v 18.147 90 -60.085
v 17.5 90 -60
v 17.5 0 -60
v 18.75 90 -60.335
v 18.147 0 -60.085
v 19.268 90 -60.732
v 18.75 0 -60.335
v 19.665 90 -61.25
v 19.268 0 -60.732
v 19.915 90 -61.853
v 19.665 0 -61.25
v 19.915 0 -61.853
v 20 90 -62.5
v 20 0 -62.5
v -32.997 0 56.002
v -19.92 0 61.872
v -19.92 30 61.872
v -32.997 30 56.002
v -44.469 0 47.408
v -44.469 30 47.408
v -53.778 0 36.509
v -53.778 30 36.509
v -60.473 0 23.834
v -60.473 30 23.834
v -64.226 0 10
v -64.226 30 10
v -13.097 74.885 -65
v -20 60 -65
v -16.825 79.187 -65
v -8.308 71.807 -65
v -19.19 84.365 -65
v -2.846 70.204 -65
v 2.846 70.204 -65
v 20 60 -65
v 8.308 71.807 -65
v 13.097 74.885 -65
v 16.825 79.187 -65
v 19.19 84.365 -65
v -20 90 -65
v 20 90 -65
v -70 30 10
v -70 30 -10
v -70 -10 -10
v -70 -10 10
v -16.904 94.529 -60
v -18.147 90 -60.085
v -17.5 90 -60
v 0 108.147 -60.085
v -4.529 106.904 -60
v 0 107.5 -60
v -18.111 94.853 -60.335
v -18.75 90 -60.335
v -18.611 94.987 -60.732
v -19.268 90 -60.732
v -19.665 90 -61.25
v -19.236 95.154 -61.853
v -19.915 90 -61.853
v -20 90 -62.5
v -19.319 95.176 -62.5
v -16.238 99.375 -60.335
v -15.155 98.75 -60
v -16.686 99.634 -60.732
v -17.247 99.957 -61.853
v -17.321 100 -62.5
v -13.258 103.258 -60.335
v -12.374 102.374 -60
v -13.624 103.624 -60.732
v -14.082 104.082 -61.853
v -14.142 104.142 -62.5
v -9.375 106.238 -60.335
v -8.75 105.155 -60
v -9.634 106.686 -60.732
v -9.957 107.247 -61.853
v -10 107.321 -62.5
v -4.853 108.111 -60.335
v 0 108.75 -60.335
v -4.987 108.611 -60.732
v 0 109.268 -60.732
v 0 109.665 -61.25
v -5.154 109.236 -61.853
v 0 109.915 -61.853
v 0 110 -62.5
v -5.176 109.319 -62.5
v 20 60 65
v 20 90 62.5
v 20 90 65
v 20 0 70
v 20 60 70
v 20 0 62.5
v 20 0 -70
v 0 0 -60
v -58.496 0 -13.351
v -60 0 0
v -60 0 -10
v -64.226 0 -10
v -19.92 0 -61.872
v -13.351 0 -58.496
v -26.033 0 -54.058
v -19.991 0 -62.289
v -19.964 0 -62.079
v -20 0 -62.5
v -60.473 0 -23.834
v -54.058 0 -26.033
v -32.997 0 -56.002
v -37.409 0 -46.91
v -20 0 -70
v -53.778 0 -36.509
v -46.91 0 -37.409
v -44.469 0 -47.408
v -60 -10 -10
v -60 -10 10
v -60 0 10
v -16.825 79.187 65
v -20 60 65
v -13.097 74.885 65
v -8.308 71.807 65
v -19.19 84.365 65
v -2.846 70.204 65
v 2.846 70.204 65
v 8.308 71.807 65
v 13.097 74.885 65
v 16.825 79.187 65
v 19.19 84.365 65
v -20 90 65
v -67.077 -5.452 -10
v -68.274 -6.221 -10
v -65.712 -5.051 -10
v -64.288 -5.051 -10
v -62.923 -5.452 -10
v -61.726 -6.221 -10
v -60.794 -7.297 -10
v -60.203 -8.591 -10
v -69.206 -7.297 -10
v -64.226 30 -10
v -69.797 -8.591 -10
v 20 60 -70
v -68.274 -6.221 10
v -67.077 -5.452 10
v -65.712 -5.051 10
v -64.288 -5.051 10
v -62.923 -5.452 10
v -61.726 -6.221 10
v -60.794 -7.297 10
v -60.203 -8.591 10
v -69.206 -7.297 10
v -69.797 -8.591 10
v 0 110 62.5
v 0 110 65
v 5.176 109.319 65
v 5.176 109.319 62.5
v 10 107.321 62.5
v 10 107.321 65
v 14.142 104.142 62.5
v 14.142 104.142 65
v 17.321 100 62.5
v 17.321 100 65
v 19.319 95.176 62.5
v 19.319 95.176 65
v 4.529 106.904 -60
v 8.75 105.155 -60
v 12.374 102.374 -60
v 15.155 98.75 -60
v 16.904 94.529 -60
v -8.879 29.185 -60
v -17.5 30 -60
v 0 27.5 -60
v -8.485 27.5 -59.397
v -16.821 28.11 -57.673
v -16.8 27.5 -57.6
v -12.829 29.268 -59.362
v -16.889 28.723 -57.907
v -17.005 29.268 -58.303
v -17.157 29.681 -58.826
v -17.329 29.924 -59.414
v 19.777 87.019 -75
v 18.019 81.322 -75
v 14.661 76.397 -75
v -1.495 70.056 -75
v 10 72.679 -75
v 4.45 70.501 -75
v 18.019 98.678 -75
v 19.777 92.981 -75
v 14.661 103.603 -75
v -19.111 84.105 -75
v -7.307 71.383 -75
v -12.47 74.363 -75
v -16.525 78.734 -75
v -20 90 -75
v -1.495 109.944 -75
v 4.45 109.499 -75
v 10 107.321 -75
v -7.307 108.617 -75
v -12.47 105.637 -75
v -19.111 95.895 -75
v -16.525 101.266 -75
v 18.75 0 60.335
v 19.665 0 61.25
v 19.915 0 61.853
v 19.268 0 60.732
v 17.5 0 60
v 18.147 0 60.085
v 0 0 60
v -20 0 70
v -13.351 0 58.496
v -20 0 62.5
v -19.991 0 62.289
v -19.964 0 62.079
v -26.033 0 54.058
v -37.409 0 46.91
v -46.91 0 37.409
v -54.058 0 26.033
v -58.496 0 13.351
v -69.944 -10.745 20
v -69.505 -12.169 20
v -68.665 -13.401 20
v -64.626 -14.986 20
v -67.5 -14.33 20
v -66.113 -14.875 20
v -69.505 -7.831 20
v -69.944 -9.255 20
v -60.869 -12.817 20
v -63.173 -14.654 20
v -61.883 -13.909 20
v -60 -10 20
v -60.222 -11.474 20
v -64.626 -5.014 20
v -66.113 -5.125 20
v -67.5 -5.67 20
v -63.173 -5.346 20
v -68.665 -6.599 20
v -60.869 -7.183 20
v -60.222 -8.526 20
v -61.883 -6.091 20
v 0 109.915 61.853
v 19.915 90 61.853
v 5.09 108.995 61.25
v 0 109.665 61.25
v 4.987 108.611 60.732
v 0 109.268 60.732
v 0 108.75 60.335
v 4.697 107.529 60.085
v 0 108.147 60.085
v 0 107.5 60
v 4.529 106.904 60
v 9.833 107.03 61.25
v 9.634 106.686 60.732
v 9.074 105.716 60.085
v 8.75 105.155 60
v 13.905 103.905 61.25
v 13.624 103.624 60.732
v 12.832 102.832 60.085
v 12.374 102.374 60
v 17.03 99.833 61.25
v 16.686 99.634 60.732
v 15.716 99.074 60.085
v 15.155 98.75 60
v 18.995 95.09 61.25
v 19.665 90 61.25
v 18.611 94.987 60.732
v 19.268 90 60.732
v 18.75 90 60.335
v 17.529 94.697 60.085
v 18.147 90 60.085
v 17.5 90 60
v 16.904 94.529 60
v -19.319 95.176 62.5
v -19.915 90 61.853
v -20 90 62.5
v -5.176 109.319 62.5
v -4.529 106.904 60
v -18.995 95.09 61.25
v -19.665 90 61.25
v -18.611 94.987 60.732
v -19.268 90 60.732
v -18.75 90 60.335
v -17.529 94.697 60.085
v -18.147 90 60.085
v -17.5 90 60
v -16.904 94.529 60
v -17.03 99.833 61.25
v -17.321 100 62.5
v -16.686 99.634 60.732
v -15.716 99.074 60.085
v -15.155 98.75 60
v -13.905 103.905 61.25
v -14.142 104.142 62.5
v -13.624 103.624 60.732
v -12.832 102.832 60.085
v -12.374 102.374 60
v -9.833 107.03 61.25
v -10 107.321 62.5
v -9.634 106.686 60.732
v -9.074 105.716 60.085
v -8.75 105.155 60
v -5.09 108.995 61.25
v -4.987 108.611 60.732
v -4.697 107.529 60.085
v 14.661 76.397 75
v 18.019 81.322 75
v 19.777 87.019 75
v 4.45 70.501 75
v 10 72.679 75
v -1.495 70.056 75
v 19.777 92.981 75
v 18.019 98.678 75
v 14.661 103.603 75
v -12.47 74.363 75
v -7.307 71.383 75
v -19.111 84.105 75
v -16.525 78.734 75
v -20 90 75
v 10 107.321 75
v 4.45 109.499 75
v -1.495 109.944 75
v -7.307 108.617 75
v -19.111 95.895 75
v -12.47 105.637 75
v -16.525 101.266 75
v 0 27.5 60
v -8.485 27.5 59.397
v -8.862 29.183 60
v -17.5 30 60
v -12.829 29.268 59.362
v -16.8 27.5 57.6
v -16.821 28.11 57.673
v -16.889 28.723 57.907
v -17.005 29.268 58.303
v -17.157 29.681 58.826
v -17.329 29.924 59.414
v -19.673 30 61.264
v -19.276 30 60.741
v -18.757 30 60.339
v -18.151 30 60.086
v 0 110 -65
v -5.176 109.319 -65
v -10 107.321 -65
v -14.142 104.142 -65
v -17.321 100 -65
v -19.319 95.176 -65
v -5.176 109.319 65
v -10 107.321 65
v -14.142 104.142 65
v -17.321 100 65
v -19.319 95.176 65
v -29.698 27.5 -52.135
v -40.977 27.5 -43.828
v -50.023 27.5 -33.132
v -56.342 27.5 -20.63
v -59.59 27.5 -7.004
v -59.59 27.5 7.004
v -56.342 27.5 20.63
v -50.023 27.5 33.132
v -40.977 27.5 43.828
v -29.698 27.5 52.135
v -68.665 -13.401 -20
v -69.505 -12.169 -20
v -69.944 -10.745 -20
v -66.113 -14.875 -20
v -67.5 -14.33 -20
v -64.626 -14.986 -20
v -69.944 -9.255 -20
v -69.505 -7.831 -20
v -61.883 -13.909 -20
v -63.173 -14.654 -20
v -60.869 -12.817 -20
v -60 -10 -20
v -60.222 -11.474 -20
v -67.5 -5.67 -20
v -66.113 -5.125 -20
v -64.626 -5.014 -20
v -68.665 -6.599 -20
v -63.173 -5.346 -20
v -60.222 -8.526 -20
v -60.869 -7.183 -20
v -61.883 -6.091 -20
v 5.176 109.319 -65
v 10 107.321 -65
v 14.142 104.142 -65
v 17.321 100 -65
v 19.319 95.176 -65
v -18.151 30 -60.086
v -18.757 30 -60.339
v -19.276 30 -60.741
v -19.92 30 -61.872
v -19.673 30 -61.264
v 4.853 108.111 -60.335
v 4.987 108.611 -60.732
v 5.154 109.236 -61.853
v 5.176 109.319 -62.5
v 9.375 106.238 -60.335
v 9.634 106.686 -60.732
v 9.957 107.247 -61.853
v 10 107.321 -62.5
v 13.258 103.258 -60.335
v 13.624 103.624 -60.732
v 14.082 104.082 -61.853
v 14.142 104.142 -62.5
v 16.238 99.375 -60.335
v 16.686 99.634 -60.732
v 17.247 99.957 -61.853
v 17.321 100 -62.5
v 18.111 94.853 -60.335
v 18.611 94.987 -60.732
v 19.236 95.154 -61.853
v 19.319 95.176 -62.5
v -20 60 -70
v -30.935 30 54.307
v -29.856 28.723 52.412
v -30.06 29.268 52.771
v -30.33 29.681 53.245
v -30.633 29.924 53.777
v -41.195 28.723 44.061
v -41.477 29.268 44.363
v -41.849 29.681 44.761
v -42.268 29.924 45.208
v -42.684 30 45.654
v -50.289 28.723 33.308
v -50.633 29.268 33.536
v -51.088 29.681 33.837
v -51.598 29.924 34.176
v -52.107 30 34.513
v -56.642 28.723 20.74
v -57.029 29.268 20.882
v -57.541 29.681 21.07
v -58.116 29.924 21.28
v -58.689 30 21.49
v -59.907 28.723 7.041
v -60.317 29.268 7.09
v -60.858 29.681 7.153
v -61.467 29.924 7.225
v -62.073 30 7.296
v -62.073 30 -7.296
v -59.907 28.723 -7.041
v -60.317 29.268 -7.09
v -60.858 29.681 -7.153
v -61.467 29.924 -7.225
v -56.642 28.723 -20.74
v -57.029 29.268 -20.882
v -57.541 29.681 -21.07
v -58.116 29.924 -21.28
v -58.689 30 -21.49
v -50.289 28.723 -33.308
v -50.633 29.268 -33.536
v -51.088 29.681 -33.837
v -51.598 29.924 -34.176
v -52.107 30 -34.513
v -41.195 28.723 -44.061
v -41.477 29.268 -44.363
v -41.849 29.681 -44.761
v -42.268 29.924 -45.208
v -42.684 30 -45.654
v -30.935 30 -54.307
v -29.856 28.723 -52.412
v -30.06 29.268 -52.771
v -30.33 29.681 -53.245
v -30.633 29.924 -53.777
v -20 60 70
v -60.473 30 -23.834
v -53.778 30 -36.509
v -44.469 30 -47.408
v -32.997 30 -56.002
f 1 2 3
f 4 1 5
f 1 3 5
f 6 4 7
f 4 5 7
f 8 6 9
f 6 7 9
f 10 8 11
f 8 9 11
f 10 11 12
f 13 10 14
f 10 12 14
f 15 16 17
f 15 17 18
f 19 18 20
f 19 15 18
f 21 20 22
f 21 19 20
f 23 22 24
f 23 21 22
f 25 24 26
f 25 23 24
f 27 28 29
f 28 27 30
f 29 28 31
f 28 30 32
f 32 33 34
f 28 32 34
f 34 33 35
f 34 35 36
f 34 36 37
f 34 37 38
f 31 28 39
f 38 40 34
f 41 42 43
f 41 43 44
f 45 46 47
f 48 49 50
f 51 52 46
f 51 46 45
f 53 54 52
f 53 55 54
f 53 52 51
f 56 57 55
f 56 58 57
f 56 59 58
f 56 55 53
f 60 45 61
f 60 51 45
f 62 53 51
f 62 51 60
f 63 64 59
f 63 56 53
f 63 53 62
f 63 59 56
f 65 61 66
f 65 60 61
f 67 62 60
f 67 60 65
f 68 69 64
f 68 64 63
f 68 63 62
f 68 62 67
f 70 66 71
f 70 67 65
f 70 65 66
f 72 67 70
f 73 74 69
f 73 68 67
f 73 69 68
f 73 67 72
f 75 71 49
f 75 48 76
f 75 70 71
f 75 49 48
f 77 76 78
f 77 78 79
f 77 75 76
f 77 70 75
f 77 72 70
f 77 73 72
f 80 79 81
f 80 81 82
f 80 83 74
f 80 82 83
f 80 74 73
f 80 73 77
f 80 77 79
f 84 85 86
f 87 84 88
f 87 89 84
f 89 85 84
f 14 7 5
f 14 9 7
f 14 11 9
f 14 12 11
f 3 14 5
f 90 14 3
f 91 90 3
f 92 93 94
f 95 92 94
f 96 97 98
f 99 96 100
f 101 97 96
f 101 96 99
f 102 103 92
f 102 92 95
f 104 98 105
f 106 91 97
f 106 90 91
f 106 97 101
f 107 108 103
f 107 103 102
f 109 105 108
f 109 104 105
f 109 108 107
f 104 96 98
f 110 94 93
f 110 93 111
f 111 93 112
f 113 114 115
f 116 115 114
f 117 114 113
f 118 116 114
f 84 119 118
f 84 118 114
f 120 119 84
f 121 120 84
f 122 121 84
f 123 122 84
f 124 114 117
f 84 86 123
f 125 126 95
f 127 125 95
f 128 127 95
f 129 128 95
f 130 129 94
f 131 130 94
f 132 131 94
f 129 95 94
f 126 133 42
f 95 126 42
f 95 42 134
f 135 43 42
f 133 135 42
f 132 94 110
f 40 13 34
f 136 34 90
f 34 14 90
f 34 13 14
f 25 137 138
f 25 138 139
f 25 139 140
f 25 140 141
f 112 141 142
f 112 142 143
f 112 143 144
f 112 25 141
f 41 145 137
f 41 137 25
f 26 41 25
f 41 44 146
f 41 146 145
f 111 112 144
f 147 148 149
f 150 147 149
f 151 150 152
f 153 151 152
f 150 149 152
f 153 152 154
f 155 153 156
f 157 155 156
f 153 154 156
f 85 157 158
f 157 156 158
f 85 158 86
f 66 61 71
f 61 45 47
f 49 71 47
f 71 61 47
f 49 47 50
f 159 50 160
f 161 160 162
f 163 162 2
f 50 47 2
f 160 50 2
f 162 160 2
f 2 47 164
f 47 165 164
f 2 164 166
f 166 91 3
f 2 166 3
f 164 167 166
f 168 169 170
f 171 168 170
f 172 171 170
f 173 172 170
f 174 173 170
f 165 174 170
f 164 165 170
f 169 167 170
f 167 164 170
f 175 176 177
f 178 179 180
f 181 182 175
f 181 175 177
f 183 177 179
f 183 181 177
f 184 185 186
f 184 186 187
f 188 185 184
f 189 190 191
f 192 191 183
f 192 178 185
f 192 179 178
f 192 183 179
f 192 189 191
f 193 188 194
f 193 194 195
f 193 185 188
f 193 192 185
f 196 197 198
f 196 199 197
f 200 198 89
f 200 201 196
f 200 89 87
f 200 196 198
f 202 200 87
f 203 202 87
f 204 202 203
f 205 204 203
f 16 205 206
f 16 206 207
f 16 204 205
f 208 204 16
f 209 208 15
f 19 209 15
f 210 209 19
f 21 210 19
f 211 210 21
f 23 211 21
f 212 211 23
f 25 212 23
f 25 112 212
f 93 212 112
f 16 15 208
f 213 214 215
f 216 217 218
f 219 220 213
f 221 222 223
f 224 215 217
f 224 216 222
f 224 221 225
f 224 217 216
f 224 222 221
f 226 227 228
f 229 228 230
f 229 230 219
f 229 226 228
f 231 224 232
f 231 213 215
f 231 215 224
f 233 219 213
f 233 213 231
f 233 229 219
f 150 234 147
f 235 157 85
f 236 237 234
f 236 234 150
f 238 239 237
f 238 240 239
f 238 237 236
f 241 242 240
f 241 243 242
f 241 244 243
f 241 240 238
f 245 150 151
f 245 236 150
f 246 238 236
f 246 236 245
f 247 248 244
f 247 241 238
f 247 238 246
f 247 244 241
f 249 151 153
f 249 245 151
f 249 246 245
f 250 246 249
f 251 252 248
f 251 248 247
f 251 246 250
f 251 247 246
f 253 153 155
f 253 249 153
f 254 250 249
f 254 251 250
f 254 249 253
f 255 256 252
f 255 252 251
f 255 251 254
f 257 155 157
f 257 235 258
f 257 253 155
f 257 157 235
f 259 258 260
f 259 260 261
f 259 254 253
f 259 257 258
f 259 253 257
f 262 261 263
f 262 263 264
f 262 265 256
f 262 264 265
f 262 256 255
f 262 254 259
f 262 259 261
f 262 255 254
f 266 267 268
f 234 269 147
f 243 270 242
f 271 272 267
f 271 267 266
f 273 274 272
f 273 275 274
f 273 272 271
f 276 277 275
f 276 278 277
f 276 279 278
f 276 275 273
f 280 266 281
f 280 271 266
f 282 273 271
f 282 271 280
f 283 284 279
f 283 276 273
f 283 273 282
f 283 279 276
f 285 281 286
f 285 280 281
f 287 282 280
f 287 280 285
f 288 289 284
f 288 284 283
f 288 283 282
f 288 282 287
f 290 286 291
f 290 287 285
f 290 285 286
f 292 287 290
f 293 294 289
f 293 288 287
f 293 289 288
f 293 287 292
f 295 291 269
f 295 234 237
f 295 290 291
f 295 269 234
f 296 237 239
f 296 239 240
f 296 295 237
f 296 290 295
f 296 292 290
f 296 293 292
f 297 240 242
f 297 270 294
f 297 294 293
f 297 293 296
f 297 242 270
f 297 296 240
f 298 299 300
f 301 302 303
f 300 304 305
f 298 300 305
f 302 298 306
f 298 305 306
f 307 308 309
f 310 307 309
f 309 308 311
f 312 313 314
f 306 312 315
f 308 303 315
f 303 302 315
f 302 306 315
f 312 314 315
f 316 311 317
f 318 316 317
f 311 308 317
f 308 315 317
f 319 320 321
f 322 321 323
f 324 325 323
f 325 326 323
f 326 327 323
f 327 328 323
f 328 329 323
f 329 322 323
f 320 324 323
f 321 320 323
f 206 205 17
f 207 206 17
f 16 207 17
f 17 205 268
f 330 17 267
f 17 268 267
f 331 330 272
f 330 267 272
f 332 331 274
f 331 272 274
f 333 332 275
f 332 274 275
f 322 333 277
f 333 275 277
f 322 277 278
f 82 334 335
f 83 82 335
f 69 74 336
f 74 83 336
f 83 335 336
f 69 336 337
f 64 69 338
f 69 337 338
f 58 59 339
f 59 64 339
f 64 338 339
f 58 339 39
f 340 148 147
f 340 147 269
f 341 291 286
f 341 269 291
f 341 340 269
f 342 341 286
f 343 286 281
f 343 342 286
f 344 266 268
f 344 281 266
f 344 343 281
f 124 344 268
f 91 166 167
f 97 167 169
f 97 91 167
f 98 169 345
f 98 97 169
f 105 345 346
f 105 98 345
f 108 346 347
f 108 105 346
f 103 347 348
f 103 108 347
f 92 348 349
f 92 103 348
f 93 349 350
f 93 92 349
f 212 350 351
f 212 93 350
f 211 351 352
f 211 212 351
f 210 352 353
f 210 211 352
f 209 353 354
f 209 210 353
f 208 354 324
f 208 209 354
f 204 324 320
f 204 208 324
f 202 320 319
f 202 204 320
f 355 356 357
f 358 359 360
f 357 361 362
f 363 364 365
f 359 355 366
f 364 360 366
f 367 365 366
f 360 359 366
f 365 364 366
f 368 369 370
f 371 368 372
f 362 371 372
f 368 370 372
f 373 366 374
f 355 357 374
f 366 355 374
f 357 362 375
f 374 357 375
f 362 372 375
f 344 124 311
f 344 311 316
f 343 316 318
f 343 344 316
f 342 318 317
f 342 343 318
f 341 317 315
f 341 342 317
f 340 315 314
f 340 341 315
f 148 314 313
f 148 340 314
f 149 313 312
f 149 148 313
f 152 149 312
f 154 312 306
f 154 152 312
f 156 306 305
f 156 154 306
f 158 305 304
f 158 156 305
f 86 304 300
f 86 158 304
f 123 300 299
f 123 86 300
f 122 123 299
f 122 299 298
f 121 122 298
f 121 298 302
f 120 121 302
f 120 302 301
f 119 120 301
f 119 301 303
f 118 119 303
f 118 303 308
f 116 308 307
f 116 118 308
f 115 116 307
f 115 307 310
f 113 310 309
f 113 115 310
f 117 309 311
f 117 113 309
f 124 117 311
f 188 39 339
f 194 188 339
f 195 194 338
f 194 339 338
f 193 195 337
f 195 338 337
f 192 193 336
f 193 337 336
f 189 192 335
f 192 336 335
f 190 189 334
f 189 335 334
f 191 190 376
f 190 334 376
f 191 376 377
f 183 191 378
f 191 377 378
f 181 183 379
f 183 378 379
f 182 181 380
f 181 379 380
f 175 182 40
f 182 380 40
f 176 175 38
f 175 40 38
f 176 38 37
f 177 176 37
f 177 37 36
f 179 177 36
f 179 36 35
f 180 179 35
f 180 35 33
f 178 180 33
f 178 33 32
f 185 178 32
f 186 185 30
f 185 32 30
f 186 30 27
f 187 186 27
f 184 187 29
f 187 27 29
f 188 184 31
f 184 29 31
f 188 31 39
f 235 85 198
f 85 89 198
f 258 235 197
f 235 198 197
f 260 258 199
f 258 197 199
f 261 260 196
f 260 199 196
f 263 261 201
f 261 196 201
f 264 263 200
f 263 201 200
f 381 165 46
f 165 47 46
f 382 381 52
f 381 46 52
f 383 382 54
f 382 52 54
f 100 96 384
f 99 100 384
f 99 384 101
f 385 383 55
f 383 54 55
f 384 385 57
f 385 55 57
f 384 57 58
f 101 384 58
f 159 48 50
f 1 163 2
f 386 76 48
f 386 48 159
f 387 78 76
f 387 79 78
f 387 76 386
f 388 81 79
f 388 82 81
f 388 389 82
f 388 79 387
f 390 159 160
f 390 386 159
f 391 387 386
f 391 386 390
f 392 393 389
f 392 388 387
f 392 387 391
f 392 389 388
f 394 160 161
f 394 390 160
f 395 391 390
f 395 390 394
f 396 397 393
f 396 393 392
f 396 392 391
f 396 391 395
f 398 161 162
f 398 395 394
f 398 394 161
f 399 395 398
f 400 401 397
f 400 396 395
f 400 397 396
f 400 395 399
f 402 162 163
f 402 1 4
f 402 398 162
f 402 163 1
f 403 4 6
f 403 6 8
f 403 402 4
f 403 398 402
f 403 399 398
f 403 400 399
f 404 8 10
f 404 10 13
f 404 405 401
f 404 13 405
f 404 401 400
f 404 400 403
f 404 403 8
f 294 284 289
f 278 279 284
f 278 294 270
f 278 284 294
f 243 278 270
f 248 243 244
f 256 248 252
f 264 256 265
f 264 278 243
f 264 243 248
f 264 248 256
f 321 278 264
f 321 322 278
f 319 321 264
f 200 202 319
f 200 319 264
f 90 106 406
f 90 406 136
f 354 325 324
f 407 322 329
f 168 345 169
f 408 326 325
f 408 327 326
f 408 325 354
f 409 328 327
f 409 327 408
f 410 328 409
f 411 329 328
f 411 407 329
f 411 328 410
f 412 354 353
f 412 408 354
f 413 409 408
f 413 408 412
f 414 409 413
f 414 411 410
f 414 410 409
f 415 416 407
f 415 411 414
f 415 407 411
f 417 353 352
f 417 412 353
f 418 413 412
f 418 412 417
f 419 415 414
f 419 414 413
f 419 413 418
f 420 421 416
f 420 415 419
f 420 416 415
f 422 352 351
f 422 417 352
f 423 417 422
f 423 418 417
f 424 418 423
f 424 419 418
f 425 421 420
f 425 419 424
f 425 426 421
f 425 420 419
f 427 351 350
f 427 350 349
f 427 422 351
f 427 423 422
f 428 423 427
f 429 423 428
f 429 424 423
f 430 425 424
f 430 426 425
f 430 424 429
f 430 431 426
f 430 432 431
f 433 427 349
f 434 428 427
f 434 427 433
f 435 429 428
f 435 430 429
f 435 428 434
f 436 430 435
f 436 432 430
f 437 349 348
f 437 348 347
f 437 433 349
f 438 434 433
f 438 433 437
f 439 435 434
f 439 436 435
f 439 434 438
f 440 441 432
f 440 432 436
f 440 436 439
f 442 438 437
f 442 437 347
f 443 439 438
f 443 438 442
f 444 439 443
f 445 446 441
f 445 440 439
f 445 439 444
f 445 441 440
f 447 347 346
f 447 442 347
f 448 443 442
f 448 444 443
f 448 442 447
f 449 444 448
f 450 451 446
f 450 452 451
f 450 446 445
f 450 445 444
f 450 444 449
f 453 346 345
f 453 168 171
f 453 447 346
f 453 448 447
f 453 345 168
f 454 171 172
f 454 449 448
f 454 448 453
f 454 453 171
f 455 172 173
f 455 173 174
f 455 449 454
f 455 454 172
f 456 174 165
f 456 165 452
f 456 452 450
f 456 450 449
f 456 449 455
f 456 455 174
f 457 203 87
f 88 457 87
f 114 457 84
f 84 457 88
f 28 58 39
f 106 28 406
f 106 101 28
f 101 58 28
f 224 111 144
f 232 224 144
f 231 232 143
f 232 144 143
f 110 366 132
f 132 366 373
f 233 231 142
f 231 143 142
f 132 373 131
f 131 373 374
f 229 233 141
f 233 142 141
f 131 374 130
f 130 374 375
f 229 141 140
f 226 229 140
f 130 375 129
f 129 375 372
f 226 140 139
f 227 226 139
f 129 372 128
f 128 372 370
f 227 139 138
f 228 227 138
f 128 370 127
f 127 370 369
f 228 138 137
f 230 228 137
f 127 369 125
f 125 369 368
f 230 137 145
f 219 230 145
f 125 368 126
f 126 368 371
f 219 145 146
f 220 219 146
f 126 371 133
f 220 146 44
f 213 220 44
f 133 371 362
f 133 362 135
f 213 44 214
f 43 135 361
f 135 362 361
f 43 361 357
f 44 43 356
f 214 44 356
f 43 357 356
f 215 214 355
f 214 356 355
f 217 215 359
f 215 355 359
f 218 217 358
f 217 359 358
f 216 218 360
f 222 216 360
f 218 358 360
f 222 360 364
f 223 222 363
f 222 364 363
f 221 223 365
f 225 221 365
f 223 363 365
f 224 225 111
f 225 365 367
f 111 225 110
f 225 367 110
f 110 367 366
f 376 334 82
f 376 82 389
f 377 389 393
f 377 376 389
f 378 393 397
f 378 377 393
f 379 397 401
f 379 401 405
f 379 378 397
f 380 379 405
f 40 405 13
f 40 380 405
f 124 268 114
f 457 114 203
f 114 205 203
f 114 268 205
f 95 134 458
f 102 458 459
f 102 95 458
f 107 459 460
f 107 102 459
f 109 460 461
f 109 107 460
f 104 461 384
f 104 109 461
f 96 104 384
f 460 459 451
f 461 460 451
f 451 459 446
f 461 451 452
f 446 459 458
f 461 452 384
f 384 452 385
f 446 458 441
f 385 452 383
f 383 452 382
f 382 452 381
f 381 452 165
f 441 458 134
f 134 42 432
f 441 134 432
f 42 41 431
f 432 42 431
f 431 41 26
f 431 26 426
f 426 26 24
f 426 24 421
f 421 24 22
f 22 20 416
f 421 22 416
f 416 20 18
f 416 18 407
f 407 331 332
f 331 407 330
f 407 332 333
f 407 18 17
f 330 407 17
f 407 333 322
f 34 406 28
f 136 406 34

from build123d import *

# Parameters (mm, degrees)
BOSS_EXTRUDE1_DEPTH      = 30
SKETCH2_W                = 40
SKETCH2_H                = 10
BOSS_EXTRUDE2_DEPTH      = 110
SKETCH3_W                = 40
SKETCH3_H                = 5
CUT_EXTRUDE1_DEPTH       = 50
SKETCH4_R                = 20
BOSS_EXTRUDE4_DEPTH      = 10
FILLET1_R                = 20
FILLET1_OF_MIRROR1_R     = 20
BOSS_EXTRUDE5_DEPTH      = 10
BOSS_EXTRUDE5_DEPTH_BACK = 30
SKETCH5_W                = 10
SKETCH5_H                = 20
BOSS_EXTRUDE6_DEPTH      = 20
BOSS_EXTRUDE6_DEPTH_BACK = 20
SKETCH6_R                = 5
FILLET2_R                = 2.5


with BuildPart() as part:
    # Sketch1 → Boss-Extrude1 (new body)
    with BuildSketch(Plane(origin=(0, 0, 0), x_dir=(1, 0, 0), z_dir=(0, 1, 0))):
        with BuildLine():
            Line((0, 65), (0, 60))
            ThreePointArc((0, 60), (-60, 0), (0, -60))
            Line((0, -60), (0, -65))
            ThreePointArc((0, -65), (-65, 0), (0, 65))
        make_face()
    extrude(amount=BOSS_EXTRUDE1_DEPTH)

    # Sketch2 → Boss-Extrude2 (add)
    with BuildSketch(Plane(origin=(0, 0, 0), x_dir=(1, 0, 0), z_dir=(0, 1, 0))):
        with Locations((0, 65)):
            Rectangle(SKETCH2_W, SKETCH2_H)
    boss_extrude2 = extrude(amount=BOSS_EXTRUDE2_DEPTH)

    # Sketch3 → Cut-Extrude1 (cut)
    with BuildSketch(Plane(origin=(0, 110, 0), x_dir=(1, 0, 0), z_dir=(0, 1, 0))):
        with Locations((0, 67.5)):
            Rectangle(SKETCH3_W, SKETCH3_H)
    cut_extrude1 = extrude(amount=-CUT_EXTRUDE1_DEPTH, mode=Mode.SUBTRACT)

    # Sketch4 → Boss-Extrude4 (add)
    with BuildSketch(Plane(origin=(0, 0, -65), x_dir=(-1, 0, 0), z_dir=(0, 0, -1))):
        with Locations((0, 90)):
            Circle(SKETCH4_R)
    boss_extrude4 = extrude(amount=BOSS_EXTRUDE4_DEPTH)

    # Fillet1
    fillet1_edges = [part.edges().sort_by_distance(p)[0] for p in [
        (20, 110, -62.5),
        (-20, 110, -62.5),
    ]]
    fillet(fillet1_edges, radius=FILLET1_R - 0.0001)  # a hair under: the kernel refuses the full size

    # Mirror1: Boss-Extrude2, Cut-Extrude1, Boss-Extrude4 across plane
    add(boss_extrude2.mirror(Plane.XY))
    add(cut_extrude1.mirror(Plane.XY), mode=Mode.SUBTRACT)
    add(boss_extrude4.mirror(Plane.XY))

    # Fillet1 of Mirror1
    fillet1_of_mirror1_edges = [part.edges().sort_by_distance(p)[0] for p in [
        (20, 110, 62.5),
        (-20, 110, 62.5),
    ]]
    fillet(fillet1_of_mirror1_edges, radius=FILLET1_OF_MIRROR1_R - 0.0001)  # a hair under: the kernel refuses the full size

    # Sketch5 → Boss-Extrude5 (add, two sides: drawn at the far end of the back side and taken through both)
    with BuildSketch(Plane.XZ.offset(-BOSS_EXTRUDE5_DEPTH_BACK)):
        with Locations((-65, 0)):
            Rectangle(SKETCH5_W, SKETCH5_H)
    extrude(amount=BOSS_EXTRUDE5_DEPTH + BOSS_EXTRUDE5_DEPTH_BACK)

    # Sketch6 → Boss-Extrude6 (add, two sides: drawn at the far end of the back side and taken through both)
    with BuildSketch(Plane.XY.offset(-BOSS_EXTRUDE6_DEPTH_BACK)):
        with Locations((-65, -10)):
            Circle(SKETCH6_R)
    extrude(amount=BOSS_EXTRUDE6_DEPTH + BOSS_EXTRUDE6_DEPTH_BACK)

    # Fillet2
    fillet2_edges = [part.edges().sort_by_distance(p)[0] for p in [
        (-20, 60.00005, 60),
        (20, 45.00005, 60),
        (0, 110, 60),
        (14.142164913, 104.142164913, 60),
        (-14.142164913, 104.142164913, 60),
    ]]
    fillet(fillet2_edges, radius=FILLET2_R)
    fillet2_2_edges = [part.edges().sort_by_distance(p)[0] for p in [
        (-60, 30, 0),
    ]]
    fillet(fillet2_2_edges, radius=FILLET2_R - 0.0001)  # a hair under: the kernel refuses the full size
    fillet2_3_edges = [part.edges().sort_by_distance(p)[0] for p in [
        (-20, 60.00005, -60),
        (-14.142164913, 104.142164913, -60),
        (0, 110, -60),
        (14.142164913, 104.142164913, -60),
        (20, 45.00005, -60),
    ]]
    fillet(fillet2_3_edges, radius=FILLET2_R)


solid = part.part
